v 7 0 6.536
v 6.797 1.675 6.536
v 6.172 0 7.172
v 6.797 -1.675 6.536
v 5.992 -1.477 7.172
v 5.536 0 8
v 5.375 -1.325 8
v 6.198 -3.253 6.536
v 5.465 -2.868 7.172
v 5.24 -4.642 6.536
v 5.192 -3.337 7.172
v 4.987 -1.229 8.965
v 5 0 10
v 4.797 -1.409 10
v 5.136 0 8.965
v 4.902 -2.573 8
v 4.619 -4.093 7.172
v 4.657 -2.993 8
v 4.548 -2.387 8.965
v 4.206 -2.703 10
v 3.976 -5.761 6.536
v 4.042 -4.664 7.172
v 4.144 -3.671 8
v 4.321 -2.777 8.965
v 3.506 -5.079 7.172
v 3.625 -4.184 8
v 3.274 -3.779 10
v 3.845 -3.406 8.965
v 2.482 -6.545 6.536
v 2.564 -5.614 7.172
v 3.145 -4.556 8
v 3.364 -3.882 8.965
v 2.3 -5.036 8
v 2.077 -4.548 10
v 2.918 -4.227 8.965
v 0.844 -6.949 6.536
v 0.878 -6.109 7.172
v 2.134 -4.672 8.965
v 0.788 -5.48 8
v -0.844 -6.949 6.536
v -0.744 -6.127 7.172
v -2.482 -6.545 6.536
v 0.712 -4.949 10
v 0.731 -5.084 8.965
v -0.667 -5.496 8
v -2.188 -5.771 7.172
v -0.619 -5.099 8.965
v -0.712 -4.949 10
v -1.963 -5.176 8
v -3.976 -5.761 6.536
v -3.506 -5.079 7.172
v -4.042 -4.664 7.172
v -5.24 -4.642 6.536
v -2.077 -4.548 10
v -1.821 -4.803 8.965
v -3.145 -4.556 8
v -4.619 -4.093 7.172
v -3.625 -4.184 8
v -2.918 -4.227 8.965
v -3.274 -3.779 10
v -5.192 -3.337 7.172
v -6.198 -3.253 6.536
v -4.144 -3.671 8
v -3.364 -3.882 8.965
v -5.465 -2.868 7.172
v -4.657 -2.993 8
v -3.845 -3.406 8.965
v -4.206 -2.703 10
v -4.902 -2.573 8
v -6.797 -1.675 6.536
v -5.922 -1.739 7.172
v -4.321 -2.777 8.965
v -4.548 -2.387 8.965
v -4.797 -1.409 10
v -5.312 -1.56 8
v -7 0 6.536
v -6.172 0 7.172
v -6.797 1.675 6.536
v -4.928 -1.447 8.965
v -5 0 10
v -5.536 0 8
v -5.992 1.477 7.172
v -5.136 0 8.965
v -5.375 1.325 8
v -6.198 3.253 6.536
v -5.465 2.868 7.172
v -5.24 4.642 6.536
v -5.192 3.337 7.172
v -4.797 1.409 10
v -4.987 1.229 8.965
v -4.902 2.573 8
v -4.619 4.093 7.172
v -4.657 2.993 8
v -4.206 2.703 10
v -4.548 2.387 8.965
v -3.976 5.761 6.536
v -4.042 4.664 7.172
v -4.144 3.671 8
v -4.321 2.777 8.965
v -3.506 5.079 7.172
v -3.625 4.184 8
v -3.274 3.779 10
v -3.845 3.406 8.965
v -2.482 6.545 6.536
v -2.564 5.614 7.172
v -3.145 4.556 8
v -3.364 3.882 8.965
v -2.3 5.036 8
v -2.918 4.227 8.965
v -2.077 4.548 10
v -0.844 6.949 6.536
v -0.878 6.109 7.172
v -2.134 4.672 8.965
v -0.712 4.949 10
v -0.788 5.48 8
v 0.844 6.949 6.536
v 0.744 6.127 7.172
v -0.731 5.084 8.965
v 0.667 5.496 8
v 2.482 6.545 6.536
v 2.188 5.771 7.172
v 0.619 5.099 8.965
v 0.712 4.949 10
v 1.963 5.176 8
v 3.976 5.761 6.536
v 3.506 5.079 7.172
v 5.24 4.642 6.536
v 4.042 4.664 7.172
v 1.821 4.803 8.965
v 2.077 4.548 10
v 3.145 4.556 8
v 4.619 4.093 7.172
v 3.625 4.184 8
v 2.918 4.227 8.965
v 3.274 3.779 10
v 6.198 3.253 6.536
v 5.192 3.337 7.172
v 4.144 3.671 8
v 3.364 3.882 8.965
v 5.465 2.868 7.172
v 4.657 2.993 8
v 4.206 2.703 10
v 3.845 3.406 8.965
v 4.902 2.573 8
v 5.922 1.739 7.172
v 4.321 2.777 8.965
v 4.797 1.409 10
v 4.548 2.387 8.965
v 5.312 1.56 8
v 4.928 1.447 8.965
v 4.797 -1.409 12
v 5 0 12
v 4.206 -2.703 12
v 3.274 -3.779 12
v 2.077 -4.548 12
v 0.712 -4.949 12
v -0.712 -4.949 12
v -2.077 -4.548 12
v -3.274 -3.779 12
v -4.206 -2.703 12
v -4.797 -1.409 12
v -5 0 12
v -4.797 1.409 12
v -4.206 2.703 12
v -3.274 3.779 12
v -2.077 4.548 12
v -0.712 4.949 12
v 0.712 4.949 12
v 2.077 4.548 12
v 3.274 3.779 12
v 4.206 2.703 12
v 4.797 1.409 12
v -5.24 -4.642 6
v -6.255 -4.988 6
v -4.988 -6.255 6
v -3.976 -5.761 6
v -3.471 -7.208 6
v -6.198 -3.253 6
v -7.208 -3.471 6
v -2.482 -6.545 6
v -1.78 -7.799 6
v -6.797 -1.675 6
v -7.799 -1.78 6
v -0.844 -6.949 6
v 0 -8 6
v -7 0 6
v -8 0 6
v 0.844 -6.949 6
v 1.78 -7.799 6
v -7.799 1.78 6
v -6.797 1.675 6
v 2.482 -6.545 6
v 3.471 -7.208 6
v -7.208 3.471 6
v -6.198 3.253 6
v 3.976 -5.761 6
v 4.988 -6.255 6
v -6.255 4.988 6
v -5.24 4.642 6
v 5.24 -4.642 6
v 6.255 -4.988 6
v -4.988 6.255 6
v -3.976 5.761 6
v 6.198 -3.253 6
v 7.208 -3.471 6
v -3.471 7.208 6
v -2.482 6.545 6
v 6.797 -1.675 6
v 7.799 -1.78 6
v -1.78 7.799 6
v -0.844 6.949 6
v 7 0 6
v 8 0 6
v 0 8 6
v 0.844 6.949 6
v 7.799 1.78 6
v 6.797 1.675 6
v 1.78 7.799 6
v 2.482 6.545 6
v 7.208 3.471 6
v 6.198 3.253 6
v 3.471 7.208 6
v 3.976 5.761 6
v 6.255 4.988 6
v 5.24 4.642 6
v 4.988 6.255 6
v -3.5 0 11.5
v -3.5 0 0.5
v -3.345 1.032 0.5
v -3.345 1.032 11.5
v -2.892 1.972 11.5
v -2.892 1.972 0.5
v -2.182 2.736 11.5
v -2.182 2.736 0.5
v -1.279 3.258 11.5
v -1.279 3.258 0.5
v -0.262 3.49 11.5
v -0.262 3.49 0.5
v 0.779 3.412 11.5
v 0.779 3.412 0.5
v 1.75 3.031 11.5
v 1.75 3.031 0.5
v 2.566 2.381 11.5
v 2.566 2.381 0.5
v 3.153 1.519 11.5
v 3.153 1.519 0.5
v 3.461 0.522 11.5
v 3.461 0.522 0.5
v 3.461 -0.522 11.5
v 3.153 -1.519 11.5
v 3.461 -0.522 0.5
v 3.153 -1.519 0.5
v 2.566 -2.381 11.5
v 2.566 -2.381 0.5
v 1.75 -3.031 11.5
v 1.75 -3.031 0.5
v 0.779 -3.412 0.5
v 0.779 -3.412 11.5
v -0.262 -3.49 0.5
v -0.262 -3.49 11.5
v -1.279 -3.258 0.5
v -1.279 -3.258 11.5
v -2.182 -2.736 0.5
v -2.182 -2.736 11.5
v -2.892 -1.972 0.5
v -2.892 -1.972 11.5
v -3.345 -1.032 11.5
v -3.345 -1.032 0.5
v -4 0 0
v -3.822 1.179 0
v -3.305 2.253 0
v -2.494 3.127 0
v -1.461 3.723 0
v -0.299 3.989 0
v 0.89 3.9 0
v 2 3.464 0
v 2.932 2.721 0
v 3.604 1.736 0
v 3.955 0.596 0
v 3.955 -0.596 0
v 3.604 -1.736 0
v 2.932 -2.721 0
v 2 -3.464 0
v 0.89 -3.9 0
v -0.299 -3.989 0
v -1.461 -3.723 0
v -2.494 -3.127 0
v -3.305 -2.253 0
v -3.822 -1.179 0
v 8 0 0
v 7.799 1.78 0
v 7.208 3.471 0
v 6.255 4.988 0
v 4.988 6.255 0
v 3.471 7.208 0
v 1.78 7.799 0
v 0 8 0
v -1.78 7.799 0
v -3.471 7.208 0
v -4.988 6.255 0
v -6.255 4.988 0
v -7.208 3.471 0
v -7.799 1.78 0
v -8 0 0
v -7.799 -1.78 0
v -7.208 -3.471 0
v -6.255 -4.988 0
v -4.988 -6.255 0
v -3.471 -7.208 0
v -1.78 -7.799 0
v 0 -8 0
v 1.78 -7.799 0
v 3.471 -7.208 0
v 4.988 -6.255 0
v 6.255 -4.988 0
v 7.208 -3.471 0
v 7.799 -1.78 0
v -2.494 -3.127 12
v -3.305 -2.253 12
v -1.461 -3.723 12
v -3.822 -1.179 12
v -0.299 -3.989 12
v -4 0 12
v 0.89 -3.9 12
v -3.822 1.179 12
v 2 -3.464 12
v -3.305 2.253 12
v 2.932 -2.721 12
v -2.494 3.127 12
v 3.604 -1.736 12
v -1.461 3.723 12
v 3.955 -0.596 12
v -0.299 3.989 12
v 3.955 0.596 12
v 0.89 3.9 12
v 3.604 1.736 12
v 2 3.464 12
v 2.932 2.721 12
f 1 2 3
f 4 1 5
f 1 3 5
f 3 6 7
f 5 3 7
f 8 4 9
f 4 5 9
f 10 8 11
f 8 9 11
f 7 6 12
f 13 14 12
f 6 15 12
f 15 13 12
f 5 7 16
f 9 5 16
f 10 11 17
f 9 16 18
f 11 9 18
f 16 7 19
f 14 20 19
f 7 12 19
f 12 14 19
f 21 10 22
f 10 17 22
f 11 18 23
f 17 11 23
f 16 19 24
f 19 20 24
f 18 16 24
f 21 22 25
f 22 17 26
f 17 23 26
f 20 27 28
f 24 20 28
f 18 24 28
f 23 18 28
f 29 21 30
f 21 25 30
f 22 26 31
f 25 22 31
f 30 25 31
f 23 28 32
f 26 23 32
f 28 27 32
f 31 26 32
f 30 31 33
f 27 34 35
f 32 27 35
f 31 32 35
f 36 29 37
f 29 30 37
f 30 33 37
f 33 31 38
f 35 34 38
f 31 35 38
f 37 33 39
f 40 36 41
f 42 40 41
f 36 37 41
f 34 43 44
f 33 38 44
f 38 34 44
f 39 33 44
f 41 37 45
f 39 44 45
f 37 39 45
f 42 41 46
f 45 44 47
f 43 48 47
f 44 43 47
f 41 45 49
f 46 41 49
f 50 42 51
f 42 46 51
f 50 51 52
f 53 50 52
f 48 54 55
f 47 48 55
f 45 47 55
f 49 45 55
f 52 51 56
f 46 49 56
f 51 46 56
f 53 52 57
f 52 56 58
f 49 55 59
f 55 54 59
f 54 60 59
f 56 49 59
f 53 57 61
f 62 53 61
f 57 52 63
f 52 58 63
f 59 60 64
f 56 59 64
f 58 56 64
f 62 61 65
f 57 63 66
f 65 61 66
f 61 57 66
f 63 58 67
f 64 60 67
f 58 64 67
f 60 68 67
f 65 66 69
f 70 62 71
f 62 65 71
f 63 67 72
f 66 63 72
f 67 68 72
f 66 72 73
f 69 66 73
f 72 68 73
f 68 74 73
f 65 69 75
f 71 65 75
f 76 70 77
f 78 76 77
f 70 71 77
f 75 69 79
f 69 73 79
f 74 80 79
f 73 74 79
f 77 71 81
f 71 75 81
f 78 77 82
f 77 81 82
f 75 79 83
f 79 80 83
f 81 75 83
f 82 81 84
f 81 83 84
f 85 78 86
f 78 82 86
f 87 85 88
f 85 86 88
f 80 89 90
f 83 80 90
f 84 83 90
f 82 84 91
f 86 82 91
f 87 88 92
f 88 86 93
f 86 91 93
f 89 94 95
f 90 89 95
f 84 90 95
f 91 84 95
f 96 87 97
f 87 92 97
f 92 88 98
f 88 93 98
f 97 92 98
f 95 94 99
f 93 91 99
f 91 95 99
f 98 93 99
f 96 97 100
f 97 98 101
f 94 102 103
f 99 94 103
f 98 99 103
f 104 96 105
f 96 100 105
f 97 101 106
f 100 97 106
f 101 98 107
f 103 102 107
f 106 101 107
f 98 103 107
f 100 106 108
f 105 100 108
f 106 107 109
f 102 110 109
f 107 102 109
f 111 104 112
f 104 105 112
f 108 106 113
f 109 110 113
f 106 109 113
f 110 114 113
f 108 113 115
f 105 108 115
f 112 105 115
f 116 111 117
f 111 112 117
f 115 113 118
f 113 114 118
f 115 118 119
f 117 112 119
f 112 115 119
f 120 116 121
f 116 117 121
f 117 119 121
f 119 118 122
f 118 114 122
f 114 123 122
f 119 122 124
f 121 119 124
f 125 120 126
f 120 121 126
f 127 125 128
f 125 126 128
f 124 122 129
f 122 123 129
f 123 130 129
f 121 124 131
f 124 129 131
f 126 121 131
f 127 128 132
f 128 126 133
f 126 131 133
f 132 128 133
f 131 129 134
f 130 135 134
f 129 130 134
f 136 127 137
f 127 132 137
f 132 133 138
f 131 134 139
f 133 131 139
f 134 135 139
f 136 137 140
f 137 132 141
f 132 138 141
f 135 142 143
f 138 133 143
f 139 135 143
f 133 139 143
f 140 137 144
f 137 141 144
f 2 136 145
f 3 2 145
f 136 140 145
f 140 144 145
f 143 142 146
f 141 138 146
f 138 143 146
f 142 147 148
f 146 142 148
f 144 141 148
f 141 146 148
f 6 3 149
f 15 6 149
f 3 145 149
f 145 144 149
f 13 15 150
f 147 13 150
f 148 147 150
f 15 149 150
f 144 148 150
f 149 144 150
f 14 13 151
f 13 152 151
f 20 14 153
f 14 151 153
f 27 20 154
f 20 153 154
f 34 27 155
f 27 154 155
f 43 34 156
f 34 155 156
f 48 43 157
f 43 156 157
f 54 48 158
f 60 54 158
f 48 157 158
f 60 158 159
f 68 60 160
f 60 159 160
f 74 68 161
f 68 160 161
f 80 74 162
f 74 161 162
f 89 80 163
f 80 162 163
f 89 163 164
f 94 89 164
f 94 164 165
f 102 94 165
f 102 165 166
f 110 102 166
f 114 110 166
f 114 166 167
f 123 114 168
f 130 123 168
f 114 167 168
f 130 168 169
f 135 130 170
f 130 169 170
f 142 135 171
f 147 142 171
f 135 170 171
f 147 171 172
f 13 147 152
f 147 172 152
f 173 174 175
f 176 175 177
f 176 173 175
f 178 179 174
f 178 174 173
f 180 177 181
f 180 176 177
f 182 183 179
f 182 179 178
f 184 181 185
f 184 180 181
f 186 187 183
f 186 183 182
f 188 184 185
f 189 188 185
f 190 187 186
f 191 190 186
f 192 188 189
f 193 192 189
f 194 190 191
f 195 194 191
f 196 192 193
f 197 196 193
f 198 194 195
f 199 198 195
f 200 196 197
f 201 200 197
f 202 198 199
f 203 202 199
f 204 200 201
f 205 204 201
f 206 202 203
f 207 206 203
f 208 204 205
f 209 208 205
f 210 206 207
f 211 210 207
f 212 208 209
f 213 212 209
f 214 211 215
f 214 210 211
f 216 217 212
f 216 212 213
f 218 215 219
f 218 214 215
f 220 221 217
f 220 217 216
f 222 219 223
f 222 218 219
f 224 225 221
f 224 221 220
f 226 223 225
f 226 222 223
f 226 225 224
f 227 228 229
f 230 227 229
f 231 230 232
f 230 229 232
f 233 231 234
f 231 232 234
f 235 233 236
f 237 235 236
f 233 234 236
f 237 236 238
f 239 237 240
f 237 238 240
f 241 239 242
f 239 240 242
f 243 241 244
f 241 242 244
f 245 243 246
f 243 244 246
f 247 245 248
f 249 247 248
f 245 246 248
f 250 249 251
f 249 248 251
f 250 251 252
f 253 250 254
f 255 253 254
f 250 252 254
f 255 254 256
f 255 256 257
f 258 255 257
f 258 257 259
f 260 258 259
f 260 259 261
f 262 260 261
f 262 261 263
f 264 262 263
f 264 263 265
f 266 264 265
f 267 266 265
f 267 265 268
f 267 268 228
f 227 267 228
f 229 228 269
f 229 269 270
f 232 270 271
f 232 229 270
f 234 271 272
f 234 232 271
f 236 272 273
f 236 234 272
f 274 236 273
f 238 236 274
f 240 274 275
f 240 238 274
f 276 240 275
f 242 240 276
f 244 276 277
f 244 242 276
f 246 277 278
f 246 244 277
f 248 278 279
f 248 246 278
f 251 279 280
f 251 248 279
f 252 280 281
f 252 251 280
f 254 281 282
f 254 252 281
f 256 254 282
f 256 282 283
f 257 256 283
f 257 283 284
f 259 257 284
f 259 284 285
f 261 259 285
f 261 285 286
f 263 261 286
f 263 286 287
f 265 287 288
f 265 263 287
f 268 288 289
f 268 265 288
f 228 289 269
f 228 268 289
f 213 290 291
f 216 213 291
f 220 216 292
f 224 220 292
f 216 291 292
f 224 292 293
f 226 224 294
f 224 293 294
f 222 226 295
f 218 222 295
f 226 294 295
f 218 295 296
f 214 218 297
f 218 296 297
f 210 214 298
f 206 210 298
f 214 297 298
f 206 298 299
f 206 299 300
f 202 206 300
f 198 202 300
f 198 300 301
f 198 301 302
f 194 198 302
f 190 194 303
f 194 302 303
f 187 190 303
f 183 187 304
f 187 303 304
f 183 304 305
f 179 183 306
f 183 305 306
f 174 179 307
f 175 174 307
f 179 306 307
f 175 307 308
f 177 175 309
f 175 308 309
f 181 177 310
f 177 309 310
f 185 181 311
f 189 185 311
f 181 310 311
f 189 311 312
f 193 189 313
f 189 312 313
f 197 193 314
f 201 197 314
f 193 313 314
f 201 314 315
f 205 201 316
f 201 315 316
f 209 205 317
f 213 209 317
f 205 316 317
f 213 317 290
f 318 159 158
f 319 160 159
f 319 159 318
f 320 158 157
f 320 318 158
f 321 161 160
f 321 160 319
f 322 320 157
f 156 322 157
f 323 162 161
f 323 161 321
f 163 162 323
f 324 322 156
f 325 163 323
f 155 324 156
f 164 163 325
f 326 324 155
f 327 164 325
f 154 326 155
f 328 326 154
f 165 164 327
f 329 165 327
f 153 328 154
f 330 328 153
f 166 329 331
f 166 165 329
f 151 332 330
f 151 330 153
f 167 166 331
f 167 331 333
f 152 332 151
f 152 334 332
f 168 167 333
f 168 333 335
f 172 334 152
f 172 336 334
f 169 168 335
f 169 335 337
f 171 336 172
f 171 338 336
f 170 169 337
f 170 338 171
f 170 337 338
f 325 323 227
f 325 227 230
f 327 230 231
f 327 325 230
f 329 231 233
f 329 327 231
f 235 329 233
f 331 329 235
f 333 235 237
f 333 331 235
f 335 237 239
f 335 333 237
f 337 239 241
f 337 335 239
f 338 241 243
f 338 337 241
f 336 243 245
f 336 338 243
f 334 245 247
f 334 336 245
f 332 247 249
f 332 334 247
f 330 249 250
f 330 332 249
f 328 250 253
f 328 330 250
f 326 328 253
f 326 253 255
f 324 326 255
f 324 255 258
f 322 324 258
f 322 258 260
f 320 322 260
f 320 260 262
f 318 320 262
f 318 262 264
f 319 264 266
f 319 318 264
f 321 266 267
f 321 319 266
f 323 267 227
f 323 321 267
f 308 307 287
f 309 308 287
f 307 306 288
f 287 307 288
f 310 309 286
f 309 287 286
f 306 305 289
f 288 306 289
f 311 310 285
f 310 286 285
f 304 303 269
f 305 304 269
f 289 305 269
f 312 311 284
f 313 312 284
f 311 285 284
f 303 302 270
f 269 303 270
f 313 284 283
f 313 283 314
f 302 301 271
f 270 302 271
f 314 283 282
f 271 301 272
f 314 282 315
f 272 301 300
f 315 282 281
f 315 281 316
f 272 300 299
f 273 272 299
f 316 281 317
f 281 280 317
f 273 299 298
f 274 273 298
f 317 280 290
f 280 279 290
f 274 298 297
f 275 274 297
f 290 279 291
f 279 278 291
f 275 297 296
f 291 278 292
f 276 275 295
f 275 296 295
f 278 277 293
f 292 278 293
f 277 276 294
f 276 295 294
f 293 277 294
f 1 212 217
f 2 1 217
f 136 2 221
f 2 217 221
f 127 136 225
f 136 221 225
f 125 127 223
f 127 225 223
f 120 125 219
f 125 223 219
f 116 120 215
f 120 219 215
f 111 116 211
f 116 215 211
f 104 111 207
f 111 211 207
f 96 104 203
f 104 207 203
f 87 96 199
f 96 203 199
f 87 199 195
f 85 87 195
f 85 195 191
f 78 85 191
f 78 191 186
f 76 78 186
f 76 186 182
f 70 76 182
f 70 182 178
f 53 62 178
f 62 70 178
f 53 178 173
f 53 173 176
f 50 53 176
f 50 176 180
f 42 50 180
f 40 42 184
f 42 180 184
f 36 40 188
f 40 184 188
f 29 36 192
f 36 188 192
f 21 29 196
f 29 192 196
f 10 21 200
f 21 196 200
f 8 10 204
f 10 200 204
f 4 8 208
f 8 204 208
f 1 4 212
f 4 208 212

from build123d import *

# Parameters (mm, degrees)
SKETCH_1_R          = 8
EXTRUDE_1_DEPTH     = 6
SKETCH_2_R          = 7
EXTRUDE_2_DEPTH     = 6
SKETCH_4_R          = 3.5
CUT_EXTRUDE_1_DEPTH = 96
CHAMFER_1_SIZE      = 0.5


with BuildPart() as part:
    # Эскиз1 → Вытянуть1 (new body)
    with BuildSketch(Plane.XY):
        Circle(SKETCH_1_R)
    extrude(amount=EXTRUDE_1_DEPTH)

    # Эскиз2 → Вытянуть2 (add)
    with BuildSketch(Plane.XY.offset(6)):
        Circle(SKETCH_2_R)
    extrude(amount=EXTRUDE_2_DEPTH)

    # Эскиз3 → Вырез-Повернуть1 (revolve, cut)
    with BuildSketch(Plane(origin=(0, 0, 0), x_dir=(0, 0, -1), z_dir=(1, 0, 0)), mode=Mode.PRIVATE) as cut_revolve_1_sk:
        with BuildLine():
            Line((-10, 5), (-12, 5))
            Line((-12, 5), (-12, 7))
            Line((-12, 7), (-6.535898385, 7))
            ThreePointArc((-6.535898385, 7), (-8, 5.535898385), (-10, 5))
        make_face()
    revolve(cut_revolve_1_sk.sketch.rotate(Axis((0, 0, 12), (0, 0, -1)), 90), axis=Axis((0, 0, 12), (0, 0, -1)), mode=Mode.SUBTRACT)  # turned: the seam where the file's is

    # Эскиз4 → Вырез-Вытянуть1 (cut)
    with BuildSketch(Plane(origin=(0, 0, 0), x_dir=(-1, 0, 0), z_dir=(0, 0, -1))):
        Circle(SKETCH_4_R)
    extrude(amount=-CUT_EXTRUDE_1_DEPTH, mode=Mode.SUBTRACT)

    # Фаска1
    chamfer_1_edges = [part.edges().sort_by_distance(p)[0] for p in [
        (3.5, 0, 12),
        (3.5, 0, 0),
    ]]
    chamfer(chamfer_1_edges, length=CHAMFER_1_SIZE)


solid = part.part
